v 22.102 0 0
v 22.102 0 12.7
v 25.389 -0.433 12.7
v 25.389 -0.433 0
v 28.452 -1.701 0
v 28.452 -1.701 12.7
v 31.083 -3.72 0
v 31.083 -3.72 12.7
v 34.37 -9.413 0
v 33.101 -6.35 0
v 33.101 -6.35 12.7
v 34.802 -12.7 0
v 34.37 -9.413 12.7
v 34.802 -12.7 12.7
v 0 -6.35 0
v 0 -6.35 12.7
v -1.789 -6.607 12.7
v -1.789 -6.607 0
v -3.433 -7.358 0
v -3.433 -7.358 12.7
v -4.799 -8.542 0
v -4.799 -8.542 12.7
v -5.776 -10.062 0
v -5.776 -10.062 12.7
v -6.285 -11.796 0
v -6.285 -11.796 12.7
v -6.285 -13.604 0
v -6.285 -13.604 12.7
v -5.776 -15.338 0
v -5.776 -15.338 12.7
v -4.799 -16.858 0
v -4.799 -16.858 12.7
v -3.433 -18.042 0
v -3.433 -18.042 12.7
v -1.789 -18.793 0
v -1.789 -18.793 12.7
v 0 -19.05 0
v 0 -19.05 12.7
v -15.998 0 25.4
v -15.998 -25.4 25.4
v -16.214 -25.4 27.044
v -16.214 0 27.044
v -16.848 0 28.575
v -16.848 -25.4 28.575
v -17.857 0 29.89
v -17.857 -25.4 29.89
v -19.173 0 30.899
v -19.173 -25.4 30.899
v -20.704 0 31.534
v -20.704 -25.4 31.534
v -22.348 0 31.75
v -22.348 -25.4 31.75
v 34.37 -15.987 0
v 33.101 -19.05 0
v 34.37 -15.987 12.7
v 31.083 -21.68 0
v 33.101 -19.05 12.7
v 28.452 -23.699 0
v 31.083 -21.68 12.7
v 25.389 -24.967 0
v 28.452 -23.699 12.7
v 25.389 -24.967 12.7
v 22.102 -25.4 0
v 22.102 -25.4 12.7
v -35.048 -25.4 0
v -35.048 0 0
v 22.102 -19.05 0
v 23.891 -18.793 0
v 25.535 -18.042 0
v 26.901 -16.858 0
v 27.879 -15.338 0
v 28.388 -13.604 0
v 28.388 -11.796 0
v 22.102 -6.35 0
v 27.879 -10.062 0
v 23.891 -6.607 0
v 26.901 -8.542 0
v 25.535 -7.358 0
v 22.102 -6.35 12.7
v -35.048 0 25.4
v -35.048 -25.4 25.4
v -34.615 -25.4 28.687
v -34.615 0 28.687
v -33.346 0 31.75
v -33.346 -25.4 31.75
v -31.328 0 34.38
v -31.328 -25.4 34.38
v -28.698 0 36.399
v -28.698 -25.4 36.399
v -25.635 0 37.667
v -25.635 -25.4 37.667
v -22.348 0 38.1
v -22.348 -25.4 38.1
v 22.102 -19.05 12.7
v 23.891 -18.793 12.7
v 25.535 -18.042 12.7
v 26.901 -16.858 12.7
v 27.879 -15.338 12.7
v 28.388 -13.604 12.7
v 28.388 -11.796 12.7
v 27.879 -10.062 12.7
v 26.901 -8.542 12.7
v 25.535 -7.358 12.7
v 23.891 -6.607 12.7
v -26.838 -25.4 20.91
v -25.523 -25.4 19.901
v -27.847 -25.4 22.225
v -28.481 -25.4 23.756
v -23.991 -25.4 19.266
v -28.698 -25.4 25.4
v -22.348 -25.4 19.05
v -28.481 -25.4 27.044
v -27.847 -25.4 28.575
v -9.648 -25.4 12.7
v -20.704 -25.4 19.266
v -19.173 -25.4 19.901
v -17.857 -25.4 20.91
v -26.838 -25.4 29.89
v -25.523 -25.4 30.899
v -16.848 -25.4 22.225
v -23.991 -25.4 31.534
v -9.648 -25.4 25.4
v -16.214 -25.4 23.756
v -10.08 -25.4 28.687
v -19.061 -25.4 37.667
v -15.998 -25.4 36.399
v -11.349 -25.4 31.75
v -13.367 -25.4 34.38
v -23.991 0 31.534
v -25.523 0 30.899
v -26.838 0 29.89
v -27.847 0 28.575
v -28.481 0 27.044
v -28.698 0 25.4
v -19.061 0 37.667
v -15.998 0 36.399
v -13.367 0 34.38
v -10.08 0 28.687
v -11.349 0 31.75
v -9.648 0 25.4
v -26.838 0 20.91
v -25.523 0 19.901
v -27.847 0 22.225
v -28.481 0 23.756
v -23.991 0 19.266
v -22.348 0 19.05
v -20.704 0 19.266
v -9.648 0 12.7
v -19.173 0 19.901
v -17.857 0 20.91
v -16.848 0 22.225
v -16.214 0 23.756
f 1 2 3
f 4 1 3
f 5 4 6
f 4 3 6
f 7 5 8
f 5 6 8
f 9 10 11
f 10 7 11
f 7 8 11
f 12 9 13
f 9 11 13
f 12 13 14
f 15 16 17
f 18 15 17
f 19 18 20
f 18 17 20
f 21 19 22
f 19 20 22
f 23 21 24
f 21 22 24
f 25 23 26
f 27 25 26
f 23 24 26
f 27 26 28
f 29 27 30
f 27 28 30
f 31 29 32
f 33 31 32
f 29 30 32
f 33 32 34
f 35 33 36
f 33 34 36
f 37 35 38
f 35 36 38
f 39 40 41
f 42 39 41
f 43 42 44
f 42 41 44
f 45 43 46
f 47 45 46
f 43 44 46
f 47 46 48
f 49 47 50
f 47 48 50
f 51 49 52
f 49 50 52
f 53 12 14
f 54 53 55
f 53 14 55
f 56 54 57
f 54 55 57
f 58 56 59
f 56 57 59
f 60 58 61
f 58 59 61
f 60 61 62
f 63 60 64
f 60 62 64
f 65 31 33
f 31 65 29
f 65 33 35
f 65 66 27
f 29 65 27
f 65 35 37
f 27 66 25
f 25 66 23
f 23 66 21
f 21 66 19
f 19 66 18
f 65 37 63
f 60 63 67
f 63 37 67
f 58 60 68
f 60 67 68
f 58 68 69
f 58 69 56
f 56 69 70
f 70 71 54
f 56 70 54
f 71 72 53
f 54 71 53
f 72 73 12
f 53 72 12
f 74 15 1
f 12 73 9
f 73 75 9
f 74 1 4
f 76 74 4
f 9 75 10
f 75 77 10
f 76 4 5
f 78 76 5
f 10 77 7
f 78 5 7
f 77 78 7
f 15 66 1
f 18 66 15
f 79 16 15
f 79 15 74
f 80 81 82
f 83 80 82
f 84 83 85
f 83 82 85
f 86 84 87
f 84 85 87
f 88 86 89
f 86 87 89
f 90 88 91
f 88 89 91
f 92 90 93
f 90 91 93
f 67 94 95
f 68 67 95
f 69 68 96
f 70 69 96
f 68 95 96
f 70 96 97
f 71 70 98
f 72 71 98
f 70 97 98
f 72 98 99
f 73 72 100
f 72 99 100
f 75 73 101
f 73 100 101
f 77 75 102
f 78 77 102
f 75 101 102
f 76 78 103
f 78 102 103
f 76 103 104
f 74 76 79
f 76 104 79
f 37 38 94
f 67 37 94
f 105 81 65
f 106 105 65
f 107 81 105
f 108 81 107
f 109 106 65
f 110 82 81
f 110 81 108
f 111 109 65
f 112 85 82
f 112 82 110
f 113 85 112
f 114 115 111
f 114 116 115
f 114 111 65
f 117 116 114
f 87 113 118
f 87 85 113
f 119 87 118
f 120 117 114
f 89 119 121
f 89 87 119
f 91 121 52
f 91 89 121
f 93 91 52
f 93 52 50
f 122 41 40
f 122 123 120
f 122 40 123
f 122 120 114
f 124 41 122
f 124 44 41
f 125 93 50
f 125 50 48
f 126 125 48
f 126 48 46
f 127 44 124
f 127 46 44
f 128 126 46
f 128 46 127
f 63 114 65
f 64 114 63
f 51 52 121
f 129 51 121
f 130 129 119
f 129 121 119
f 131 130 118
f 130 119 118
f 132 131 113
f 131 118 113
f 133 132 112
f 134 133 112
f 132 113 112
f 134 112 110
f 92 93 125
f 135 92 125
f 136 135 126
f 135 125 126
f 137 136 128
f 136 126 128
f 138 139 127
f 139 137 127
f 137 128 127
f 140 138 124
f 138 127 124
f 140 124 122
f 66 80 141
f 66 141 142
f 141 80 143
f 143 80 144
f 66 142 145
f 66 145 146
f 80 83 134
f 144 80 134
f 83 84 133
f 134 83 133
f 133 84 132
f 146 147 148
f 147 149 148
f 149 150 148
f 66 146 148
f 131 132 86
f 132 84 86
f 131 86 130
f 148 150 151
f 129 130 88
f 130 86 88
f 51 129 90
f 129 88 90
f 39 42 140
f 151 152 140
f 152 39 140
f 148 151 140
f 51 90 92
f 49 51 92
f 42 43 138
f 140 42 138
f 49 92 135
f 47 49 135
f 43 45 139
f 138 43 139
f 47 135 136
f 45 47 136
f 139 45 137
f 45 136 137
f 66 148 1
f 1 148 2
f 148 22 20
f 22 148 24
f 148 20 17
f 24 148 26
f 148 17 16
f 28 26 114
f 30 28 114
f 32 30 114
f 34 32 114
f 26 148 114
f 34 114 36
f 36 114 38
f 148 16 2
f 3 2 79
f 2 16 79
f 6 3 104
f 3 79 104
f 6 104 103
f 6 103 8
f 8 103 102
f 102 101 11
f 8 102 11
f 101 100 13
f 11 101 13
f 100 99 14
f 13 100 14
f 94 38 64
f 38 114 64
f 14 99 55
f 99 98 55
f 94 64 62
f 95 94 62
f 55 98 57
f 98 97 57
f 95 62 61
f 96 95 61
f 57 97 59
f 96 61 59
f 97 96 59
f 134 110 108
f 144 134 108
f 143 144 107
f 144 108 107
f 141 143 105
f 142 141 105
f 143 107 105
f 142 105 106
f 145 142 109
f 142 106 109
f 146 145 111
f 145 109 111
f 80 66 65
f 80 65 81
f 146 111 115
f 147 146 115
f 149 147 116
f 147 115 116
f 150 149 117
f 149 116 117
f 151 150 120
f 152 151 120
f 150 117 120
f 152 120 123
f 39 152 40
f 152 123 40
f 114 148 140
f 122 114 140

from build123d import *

# Parameters (mm, degrees)
F0_W      = 69.85
F0_H      = 38.1
F1_DEPTH  = 25.4
F2_W      = 44.45
F2_H      = 25.4
F3_DEPTH  = 25.401
F5_DEPTH  = 25.401
F7_DEPTH  = 25.401
F9_DEPTH  = 12.701
F10_W     = 22.1024058417
F10_H     = 12.7
F11_DEPTH = 25.4
F13_DEPTH = 12.701


with BuildPart() as f1:
    # F0 (on Front) → F1 (new body)
    with BuildSketch(Plane.XZ):
        with Locations((-0.1225941583, 19.05)):
            Rectangle(F0_W, F0_H)
    extrude(amount=F1_DEPTH)

    # F2 (on face) → F3 (cut, through all)
    with BuildSketch(Plane.XZ.offset(25.4)):
        with Locations((12.5774058417, 25.4)):
            Rectangle(F2_W, F2_H)
    extrude(amount=-F3_DEPTH, mode=Mode.SUBTRACT)

    # F4 (on face) → F5 (cut, through all)
    with BuildSketch(Plane.XZ.offset(25.4)):
        with BuildLine():
            Line((-9.6475941583, 38.1), (-22.3475941583, 38.1))
            ThreePointArc((-22.3475941583, 38.1), (-13.3673380372, 34.3802561211), (-9.6475941583, 25.4))
            Line((-9.6475941583, 25.4), (-9.6475941583, 38.1))
        make_face()
        with BuildLine():
            Line((-22.3475941583, 38.1), (-35.0475941583, 38.1))
            Line((-35.0475941583, 38.1), (-35.0475941583, 25.4))
            ThreePointArc((-35.0475941583, 25.4), (-31.3278502794, 34.3802561211), (-22.3475941583, 38.1))
        make_face()
    extrude(amount=-F5_DEPTH, mode=Mode.SUBTRACT)

    # F6 (on face) → F7 (cut, through all)
    with BuildSketch(Plane.XZ.offset(25.4)):
        with BuildLine():
            ThreePointArc((-22.3475941583, 31.75), (-26.8377222188, 29.8901280605), (-28.6975941583, 25.4))
            Line((-28.6975941583, 25.4), (-22.3475941583, 25.4))
            Line((-22.3475941583, 25.4), (-22.3475941583, 31.75))
        make_face()
        with BuildLine():
            Line((-22.3475941583, 31.75), (-22.3475941583, 25.4))
            Line((-22.3475941583, 25.4), (-15.9975941583, 25.4))
            ThreePointArc((-15.9975941583, 25.4), (-17.8574660977, 29.8901280605), (-22.3475941583, 31.75))
        make_face()
        with BuildLine():
            Line((-15.9975941583, 25.4), (-22.3475941583, 25.4))
            Line((-22.3475941583, 25.4), (-22.3475941583, 19.05))
            ThreePointArc((-22.3475941583, 19.05), (-17.8574660977, 20.9098719395), (-15.9975941583, 25.4))
        make_face()
        with BuildLine():
            Line((-22.3475941583, 25.4), (-28.6975941583, 25.4))
            ThreePointArc((-28.6975941583, 25.4), (-26.8377222188, 20.9098719395), (-22.3475941583, 19.05))
            Line((-22.3475941583, 19.05), (-22.3475941583, 25.4))
        make_face()
    extrude(amount=-F7_DEPTH, mode=Mode.SUBTRACT)

    # F8 (on face) → F9 (cut, through all)
    with BuildSketch(Plane.XY.offset(12.7)):
        with BuildLine():
            Line((28.4524058417, 0), (22.1024058417, 0))
            ThreePointArc((22.1024058417, 0), (31.0826619628, -3.7197438789), (34.8024058417, -12.7))
            Line((34.8024058417, -12.7), (34.8024058417, 0))
            Line((34.8024058417, 0), (28.4524058417, 0))
        make_face()
        with BuildLine():
            ThreePointArc((34.8024058417, -12.7), (31.0826619628, -21.6802561211), (22.1024058417, -25.4))
            Line((22.1024058417, -25.4), (28.4524058417, -25.4))
            Line((28.4524058417, -25.4), (34.8024058417, -25.4))
            Line((34.8024058417, -25.4), (34.8024058417, -12.7))
        make_face()
    extrude(amount=-F9_DEPTH, mode=Mode.SUBTRACT)

    # F10 (on face) → F11 (cut)
    with BuildSketch(Plane.XY.offset(12.7)):
        with Locations((11.0512029209, -12.7)):
            Rectangle(F10_W, F10_H)
    extrude(amount=-F11_DEPTH, mode=Mode.SUBTRACT)

    # F12 (on face) → F13 (cut, through all)
    with BuildSketch(Plane.XY.offset(12.7)):
        with BuildLine():
            ThreePointArc((0, -6.35), (-6.35, -12.7), (0, -19.05))
            Line((0, -19.05), (0, -6.35))
        make_face()
        with BuildLine():
            Line((22.1024058417, -6.35), (22.1024058417, -19.05))
            ThreePointArc((22.1024058417, -19.05), (28.4524058417, -12.7), (22.1024058417, -6.35))
        make_face()
    extrude(amount=-F13_DEPTH, mode=Mode.SUBTRACT)


solid = f1.part
